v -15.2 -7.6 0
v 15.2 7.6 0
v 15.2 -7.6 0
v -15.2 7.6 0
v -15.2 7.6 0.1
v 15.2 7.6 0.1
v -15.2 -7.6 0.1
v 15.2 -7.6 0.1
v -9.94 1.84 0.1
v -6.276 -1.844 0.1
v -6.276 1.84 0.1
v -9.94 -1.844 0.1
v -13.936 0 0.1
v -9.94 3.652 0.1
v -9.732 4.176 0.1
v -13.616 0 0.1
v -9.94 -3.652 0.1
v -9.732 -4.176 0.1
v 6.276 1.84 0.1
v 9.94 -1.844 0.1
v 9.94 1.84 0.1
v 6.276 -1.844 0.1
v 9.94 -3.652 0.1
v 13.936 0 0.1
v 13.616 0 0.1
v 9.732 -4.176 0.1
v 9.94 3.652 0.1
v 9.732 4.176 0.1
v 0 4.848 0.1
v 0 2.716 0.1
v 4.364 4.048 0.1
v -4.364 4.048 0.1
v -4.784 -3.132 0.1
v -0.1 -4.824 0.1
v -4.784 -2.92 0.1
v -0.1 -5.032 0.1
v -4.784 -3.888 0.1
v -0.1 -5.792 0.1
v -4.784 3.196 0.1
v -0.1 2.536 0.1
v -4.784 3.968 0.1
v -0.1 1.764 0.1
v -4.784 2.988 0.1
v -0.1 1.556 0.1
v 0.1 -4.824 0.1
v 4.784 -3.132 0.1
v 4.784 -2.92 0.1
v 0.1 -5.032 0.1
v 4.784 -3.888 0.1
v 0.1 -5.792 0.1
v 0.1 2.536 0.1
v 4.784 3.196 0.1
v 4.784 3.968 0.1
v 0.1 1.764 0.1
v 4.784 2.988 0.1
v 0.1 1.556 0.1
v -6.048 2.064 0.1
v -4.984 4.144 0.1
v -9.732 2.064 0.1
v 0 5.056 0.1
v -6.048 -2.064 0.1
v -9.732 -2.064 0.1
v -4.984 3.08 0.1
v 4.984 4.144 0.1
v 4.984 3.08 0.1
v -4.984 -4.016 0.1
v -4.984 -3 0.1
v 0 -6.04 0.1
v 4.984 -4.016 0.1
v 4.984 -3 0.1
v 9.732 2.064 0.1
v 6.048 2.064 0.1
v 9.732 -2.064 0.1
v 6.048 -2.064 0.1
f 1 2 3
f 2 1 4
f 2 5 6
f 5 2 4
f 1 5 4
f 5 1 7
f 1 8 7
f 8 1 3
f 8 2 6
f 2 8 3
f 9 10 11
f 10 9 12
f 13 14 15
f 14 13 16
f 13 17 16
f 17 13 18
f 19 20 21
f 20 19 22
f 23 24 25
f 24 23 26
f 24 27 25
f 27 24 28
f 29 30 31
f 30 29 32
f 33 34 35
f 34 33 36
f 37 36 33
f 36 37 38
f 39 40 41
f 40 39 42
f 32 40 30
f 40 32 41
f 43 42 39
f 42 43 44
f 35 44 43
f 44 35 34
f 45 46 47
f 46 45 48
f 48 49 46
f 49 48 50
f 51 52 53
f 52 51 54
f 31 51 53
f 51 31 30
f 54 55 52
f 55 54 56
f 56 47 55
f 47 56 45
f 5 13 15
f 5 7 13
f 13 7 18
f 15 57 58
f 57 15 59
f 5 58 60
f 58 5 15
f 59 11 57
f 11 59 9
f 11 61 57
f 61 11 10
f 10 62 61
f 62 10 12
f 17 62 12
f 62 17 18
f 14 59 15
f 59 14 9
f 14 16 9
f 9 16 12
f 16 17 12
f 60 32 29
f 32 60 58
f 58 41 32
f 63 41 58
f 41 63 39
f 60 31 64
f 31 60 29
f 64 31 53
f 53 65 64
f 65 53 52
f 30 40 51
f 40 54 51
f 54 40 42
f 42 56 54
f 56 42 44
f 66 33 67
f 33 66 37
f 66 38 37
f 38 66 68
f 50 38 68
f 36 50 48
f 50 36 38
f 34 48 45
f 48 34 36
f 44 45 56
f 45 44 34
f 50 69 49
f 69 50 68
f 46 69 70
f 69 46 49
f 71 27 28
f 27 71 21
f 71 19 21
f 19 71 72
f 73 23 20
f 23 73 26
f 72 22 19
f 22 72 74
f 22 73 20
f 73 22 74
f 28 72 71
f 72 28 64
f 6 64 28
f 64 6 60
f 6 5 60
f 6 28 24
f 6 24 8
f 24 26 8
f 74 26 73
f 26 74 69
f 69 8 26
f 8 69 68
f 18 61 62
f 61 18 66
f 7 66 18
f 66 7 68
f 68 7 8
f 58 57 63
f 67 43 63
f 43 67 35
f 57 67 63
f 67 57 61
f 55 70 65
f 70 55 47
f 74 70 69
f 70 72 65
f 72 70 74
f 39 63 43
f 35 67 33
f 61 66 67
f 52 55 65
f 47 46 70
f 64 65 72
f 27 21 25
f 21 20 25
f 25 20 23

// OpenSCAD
// file: ../p/box5-12.scad
use <../lib.scad>
function ldraw_lib__box5_12() = [
// 0 Box with 5 Faces without Any Edges
// 0 Name: box5-12.dat
// 0 Author: Chris Dee [cwdee]
// 0 !LDRAW_ORG Primitive UPDATE 2009-02
// 0 !LICENSE Licensed under CC BY 2.0 and CC BY 4.0 : see CAreadme.txt
// 
// 0 BFC CERTIFY CCW
  [0,"BFC","CERTIFY"],
  [0,"BFC","CCW"],
// 
// 0 !HISTORY 2009-09-03 [PTadmin] Official Update 2009-02
// 
// 
// 4 16 1 1 1 1 1 -1 -1 1 -1 -1 1 1
  [4,16,1,1,1,1,1,-1,-1,1,-1,-1,1,1],
// 4 16 -1 0 1 1 0 1 1 1 1 -1 1 1
  [4,16,-1,0,1,1,0,1,1,1,1,-1,1,1],
// 4 16 -1 0 -1 -1 0 1 -1 1 1 -1 1 -1
  [4,16,-1,0,-1,-1,0,1,-1,1,1,-1,1,-1],
// 4 16 1 0 -1 -1 0 -1 -1 1 -1 1 1 -1
  [4,16,1,0,-1,-1,0,-1,-1,1,-1,1,1,-1],
// 4 16 1 0 1 1 0 -1 1 1 -1 1 1 1
  [4,16,1,0,1,1,0,-1,1,1,-1,1,1,1],
// 0
];
makepoly(ldraw_lib__box5_12(), line=0.2);
// main file
use <../lib.scad>
use <../p/box5-12.scad>
function ldraw_lib__190145a() = [
// 0 Sticker  1.9 x  3.8 with Yellow Box and Arrows
// 0 Name: 190145a.dat
// 0 Author: Rafael Skibicki [Rola]
// 0 !LDRAW_ORG Part UPDATE 2012-03
// 0 !LICENSE Licensed under CC BY 2.0 and CC BY 4.0 : see CAreadme.txt
// 
// 0 BFC CERTIFY CCW
  [0,"BFC","CERTIFY"],
  [0,"BFC","CCW"],
// 
// 0 !KEYWORDS Cargo, container, Crane, set 6361, town, Trains
// 
// 0 !HISTORY 2012-08-01 [MagFors] BFC'd, removed t-junctions
// 0 !HISTORY 2012-11-22 [MMR1988] removed '0' at file end.
// 0 !HISTORY 2012-12-28 [PTadmin] Official Update 2012-03
// 
// 
// 1 16 0 -0.25 0 38 0 0 0 0.25 0 0 0 19 box5-12.dat
  [1,16,0,-0.25,0,38,0,0,0,0.25,0,0,0,19, ldraw_lib__box5_12()],
// 4 14 -15.69 -0.25 -4.61 -15.69 -0.25 4.6 -24.85 -0.25 4.6 -24.85 -0.25 -4.61
  [4,14,-15.69,-0.25,-4.61,-15.69,-0.25,4.6,-24.85,-0.25,4.6,-24.85,-0.25,-4.61],
// 4 0 -34.04 -0.25 0 -24.85 -0.25 9.13 -24.33 -0.25 10.44 -34.84 -0.25 0
  [4,0,-34.04,-0.25,0,-24.85,-0.25,9.13,-24.33,-0.25,10.44,-34.84,-0.25,0],
// 4 0 -24.33 -0.25 -10.44 -24.85 -0.25 -9.13 -34.04 -0.25 0 -34.84 -0.25 0
  [4,0,-24.33,-0.25,-10.44,-24.85,-0.25,-9.13,-34.04,-0.25,0,-34.84,-0.25,0],
// 4 14 15.69 -0.25 4.6 15.69 -0.25 -4.61 24.85 -0.25 -4.61 24.85 -0.25 4.6
  [4,14,15.69,-0.25,4.6,15.69,-0.25,-4.61,24.85,-0.25,-4.61,24.85,-0.25,4.6],
// 4 0 34.04 -0.25 0 24.85 -0.25 -9.13 24.33 -0.25 -10.44 34.84 -0.25 0
  [4,0,34.04,-0.25,0,24.85,-0.25,-9.13,24.33,-0.25,-10.44,34.84,-0.25,0],
// 4 0 24.33 -0.25 10.44 24.85 -0.25 9.13 34.04 -0.25 0 34.84 -0.25 0
  [4,0,24.33,-0.25,10.44,24.85,-0.25,9.13,34.04,-0.25,0,34.84,-0.25,0],
// 4 14 0 -0.25 6.79 10.91 -0.25 10.12 0 -0.25 12.12 -10.91 -0.25 10.12
  [4,14,0,-0.25,6.79,10.91,-0.25,10.12,0,-0.25,12.12,-10.91,-0.25,10.12],
// 4 0 -11.96 -0.25 -7.83 -0.25 -0.25 -12.58 -0.25 -0.25 -12.06 -11.96 -0.25 -7.3
  [4,0,-11.96,-0.25,-7.83,-0.25,-0.25,-12.58,-0.25,-0.25,-12.06,-11.96,-0.25,-7.3],
// 4 14 -11.96 -0.25 -7.83 -11.96 -0.25 -9.72 -0.25 -0.25 -14.48 -0.25 -0.25 -12.58
  [4,14,-11.96,-0.25,-7.83,-11.96,-0.25,-9.72,-0.25,-0.25,-14.48,-0.25,-0.25,-12.58],
// 4 14 -0.25 -0.25 6.34 -11.96 -0.25 9.92 -11.96 -0.25 7.99 -0.25 -0.25 4.41
  [4,14,-0.25,-0.25,6.34,-11.96,-0.25,9.92,-11.96,-0.25,7.99,-0.25,-0.25,4.41],
// 4 0 -10.91 -0.25 10.12 -11.96 -0.25 9.92 -0.25 -0.25 6.34 0 -0.25 6.79
  [4,0,-10.91,-0.25,10.12,-11.96,-0.25,9.92,-0.25,-0.25,6.34,0,-0.25,6.79],
// 4 0 -0.25 -0.25 4.41 -11.96 -0.25 7.99 -11.96 -0.25 7.47 -0.25 -0.25 3.89
  [4,0,-0.25,-0.25,4.41,-11.96,-0.25,7.99,-11.96,-0.25,7.47,-0.25,-0.25,3.89],
// 4 14 -0.25 -0.25 3.89 -11.96 -0.25 7.47 -11.96 -0.25 -7.3 -0.25 -0.25 -12.06
  [4,14,-0.25,-0.25,3.89,-11.96,-0.25,7.47,-11.96,-0.25,-7.3,-0.25,-0.25,-12.06],
// 4 0 0.25 -0.25 -12.06 0.25 -0.25 -12.58 11.96 -0.25 -7.83 11.96 -0.25 -7.3
  [4,0,0.25,-0.25,-12.06,0.25,-0.25,-12.58,11.96,-0.25,-7.83,11.96,-0.25,-7.3],
// 4 14 0.25 -0.25 -14.48 11.96 -0.25 -9.72 11.96 -0.25 -7.83 0.25 -0.25 -12.58
  [4,14,0.25,-0.25,-14.48,11.96,-0.25,-9.72,11.96,-0.25,-7.83,0.25,-0.25,-12.58],
// 4 14 11.96 -0.25 7.99 11.96 -0.25 9.92 0.25 -0.25 6.34 0.25 -0.25 4.41
  [4,14,11.96,-0.25,7.99,11.96,-0.25,9.92,0.25,-0.25,6.34,0.25,-0.25,4.41],
// 4 0 0.25 -0.25 6.34 11.96 -0.25 9.92 10.91 -0.25 10.12 0 -0.25 6.79
  [4,0,0.25,-0.25,6.34,11.96,-0.25,9.92,10.91,-0.25,10.12,0,-0.25,6.79],
// 4 0 11.96 -0.25 7.47 11.96 -0.25 7.99 0.25 -0.25 4.41 0.25 -0.25 3.89
  [4,0,11.96,-0.25,7.47,11.96,-0.25,7.99,0.25,-0.25,4.41,0.25,-0.25,3.89],
// 4 14 11.96 -0.25 -7.3 11.96 -0.25 7.47 0.25 -0.25 3.89 0.25 -0.25 -12.06
  [4,14,11.96,-0.25,-7.3,11.96,-0.25,7.47,0.25,-0.25,3.89,0.25,-0.25,-12.06],
// 3 16 -38 -0.25 19 -34.84 -0.25 0 -24.33 -0.25 10.44
  [3,16,-38,-0.25,19,-34.84,-0.25,0,-24.33,-0.25,10.44],
// 3 16 -38 -0.25 19 -38 -0.25 -19 -34.84 -0.25 0
  [3,16,-38,-0.25,19,-38,-0.25,-19,-34.84,-0.25,0],
// 3 16 -34.84 -0.25 0 -38 -0.25 -19 -24.33 -0.25 -10.44
  [3,16,-34.84,-0.25,0,-38,-0.25,-19,-24.33,-0.25,-10.44],
// 4 16 -24.33 -0.25 10.44 -24.33 -0.25 5.16 -15.12 -0.25 5.16 -12.46 -0.25 10.36
  [4,16,-24.33,-0.25,10.44,-24.33,-0.25,5.16,-15.12,-0.25,5.16,-12.46,-0.25,10.36],
// 4 16 -24.33 -0.25 10.44 -12.46 -0.25 10.36 0 -0.25 12.64 -38 -0.25 19
  [4,16,-24.33,-0.25,10.44,-12.46,-0.25,10.36,0,-0.25,12.64,-38,-0.25,19],
// 4 0 -24.33 -0.25 5.16 -24.85 -0.25 4.6 -15.69 -0.25 4.6 -15.12 -0.25 5.16
  [4,0,-24.33,-0.25,5.16,-24.85,-0.25,4.6,-15.69,-0.25,4.6,-15.12,-0.25,5.16],
// 4 0 -15.12 -0.25 5.16 -15.69 -0.25 4.6 -15.69 -0.25 -4.61 -15.12 -0.25 -5.16
  [4,0,-15.12,-0.25,5.16,-15.69,-0.25,4.6,-15.69,-0.25,-4.61,-15.12,-0.25,-5.16],
// 4 0 -15.69 -0.25 -4.61 -24.85 -0.25 -4.61 -24.33 -0.25 -5.16 -15.12 -0.25 -5.16
  [4,0,-15.69,-0.25,-4.61,-24.85,-0.25,-4.61,-24.33,-0.25,-5.16,-15.12,-0.25,-5.16],
// 4 0 -24.33 -0.25 -5.16 -24.85 -0.25 -4.61 -24.85 -0.25 -9.13 -24.33 -0.25 -10.44
  [4,0,-24.33,-0.25,-5.16,-24.85,-0.25,-4.61,-24.85,-0.25,-9.13,-24.33,-0.25,-10.44],
// 4 0 -24.85 -0.25 9.13 -24.85 -0.25 4.6 -24.33 -0.25 5.16 -24.33 -0.25 10.44
  [4,0,-24.85,-0.25,9.13,-24.85,-0.25,4.6,-24.33,-0.25,5.16,-24.33,-0.25,10.44],
// 3 14 -24.85 -0.25 9.13 -34.04 -0.25 0 -24.85 -0.25 4.6
  [3,14,-24.85,-0.25,9.13,-34.04,-0.25,0,-24.85,-0.25,4.6],
// 3 14 -24.85 -0.25 4.6 -34.04 -0.25 0 -24.85 -0.25 -4.61
  [3,14,-24.85,-0.25,4.6,-34.04,-0.25,0,-24.85,-0.25,-4.61],
// 3 14 -34.04 -0.25 0 -24.85 -0.25 -9.13 -24.85 -0.25 -4.61
  [3,14,-34.04,-0.25,0,-24.85,-0.25,-9.13,-24.85,-0.25,-4.61],
// 4 0 -12.46 -0.25 10.36 -10.91 -0.25 10.12 0 -0.25 12.12 0 -0.25 12.64
  [4,0,-12.46,-0.25,10.36,-10.91,-0.25,10.12,0,-0.25,12.12,0,-0.25,12.64],
// 3 0 -12.46 -0.25 10.36 -11.96 -0.25 9.92 -10.91 -0.25 10.12
  [3,0,-12.46,-0.25,10.36,-11.96,-0.25,9.92,-10.91,-0.25,10.12],
// 4 0 -11.96 -0.25 7.99 -11.96 -0.25 9.92 -12.46 -0.25 10.36 -12.46 -0.25 7.7
  [4,0,-11.96,-0.25,7.99,-11.96,-0.25,9.92,-12.46,-0.25,10.36,-12.46,-0.25,7.7],
// 4 0 0 -0.25 12.12 10.91 -0.25 10.12 12.46 -0.25 10.36 0 -0.25 12.64
  [4,0,0,-0.25,12.12,10.91,-0.25,10.12,12.46,-0.25,10.36,0,-0.25,12.64],
// 3 0 12.46 -0.25 10.36 10.91 -0.25 10.12 11.96 -0.25 9.92
  [3,0,12.46,-0.25,10.36,10.91,-0.25,10.12,11.96,-0.25,9.92],
// 4 0 12.46 -0.25 10.36 11.96 -0.25 9.92 11.96 -0.25 7.99 12.46 -0.25 7.7
  [4,0,12.46,-0.25,10.36,11.96,-0.25,9.92,11.96,-0.25,7.99,12.46,-0.25,7.7],
// 3 0 0 -0.25 6.79 -0.25 -0.25 6.34 0.25 -0.25 6.34
  [3,0,0,-0.25,6.79,-0.25,-0.25,6.34,0.25,-0.25,6.34],
// 4 0 0.25 -0.25 6.34 -0.25 -0.25 6.34 -0.25 -0.25 4.41 0.25 -0.25 4.41
  [4,0,0.25,-0.25,6.34,-0.25,-0.25,6.34,-0.25,-0.25,4.41,0.25,-0.25,4.41],
// 4 0 0.25 -0.25 4.41 -0.25 -0.25 4.41 -0.25 -0.25 3.89 0.25 -0.25 3.89
  [4,0,0.25,-0.25,4.41,-0.25,-0.25,4.41,-0.25,-0.25,3.89,0.25,-0.25,3.89],
// 4 0 -12.46 -0.25 -10.04 -11.96 -0.25 -9.72 -11.96 -0.25 -7.83 -12.46 -0.25 -7.5
  [4,0,-12.46,-0.25,-10.04,-11.96,-0.25,-9.72,-11.96,-0.25,-7.83,-12.46,-0.25,-7.5],
// 4 0 -0.25 -0.25 -14.48 -11.96 -0.25 -9.72 -12.46 -0.25 -10.04 0 -0.25 -15.1
  [4,0,-0.25,-0.25,-14.48,-11.96,-0.25,-9.72,-12.46,-0.25,-10.04,0,-0.25,-15.1],
// 3 0 0.25 -0.25 -14.48 -0.25 -0.25 -14.48 0 -0.25 -15.1
  [3,0,0.25,-0.25,-14.48,-0.25,-0.25,-14.48,0,-0.25,-15.1],
// 4 0 0.25 -0.25 -12.58 -0.25 -0.25 -12.58 -0.25 -0.25 -14.48 0.25 -0.25 -14.48
  [4,0,0.25,-0.25,-12.58,-0.25,-0.25,-12.58,-0.25,-0.25,-14.48,0.25,-0.25,-14.48],
// 4 0 0.25 -0.25 -12.06 -0.25 -0.25 -12.06 -0.25 -0.25 -12.58 0.25 -0.25 -12.58
  [4,0,0.25,-0.25,-12.06,-0.25,-0.25,-12.06,-0.25,-0.25,-12.58,0.25,-0.25,-12.58],
// 4 0 0.25 -0.25 3.89 -0.25 -0.25 3.89 -0.25 -0.25 -12.06 0.25 -0.25 -12.06
  [4,0,0.25,-0.25,3.89,-0.25,-0.25,3.89,-0.25,-0.25,-12.06,0.25,-0.25,-12.06],
// 4 0 12.46 -0.25 -10.04 11.96 -0.25 -9.72 0.25 -0.25 -14.48 0 -0.25 -15.1
  [4,0,12.46,-0.25,-10.04,11.96,-0.25,-9.72,0.25,-0.25,-14.48,0,-0.25,-15.1],
// 4 0 11.96 -0.25 -7.83 11.96 -0.25 -9.72 12.46 -0.25 -10.04 12.46 -0.25 -7.5
  [4,0,11.96,-0.25,-7.83,11.96,-0.25,-9.72,12.46,-0.25,-10.04,12.46,-0.25,-7.5],
// 4 0 24.33 -0.25 5.16 24.85 -0.25 4.6 24.85 -0.25 9.13 24.33 -0.25 10.44
  [4,0,24.33,-0.25,5.16,24.85,-0.25,4.6,24.85,-0.25,9.13,24.33,-0.25,10.44],
// 4 0 15.69 -0.25 4.6 24.85 -0.25 4.6 24.33 -0.25 5.16 15.12 -0.25 5.16
  [4,0,15.69,-0.25,4.6,24.85,-0.25,4.6,24.33,-0.25,5.16,15.12,-0.25,5.16],
// 4 0 24.85 -0.25 -9.13 24.85 -0.25 -4.61 24.33 -0.25 -5.16 24.33 -0.25 -10.44
  [4,0,24.85,-0.25,-9.13,24.85,-0.25,-4.61,24.33,-0.25,-5.16,24.33,-0.25,-10.44],
// 4 0 15.12 -0.25 5.16 15.12 -0.25 -5.16 15.69 -0.25 -4.61 15.69 -0.25 4.6
  [4,0,15.12,-0.25,5.16,15.12,-0.25,-5.16,15.69,-0.25,-4.61,15.69,-0.25,4.6],
// 4 0 15.69 -0.25 -4.61 15.12 -0.25 -5.16 24.33 -0.25 -5.16 24.85 -0.25 -4.61
  [4,0,15.69,-0.25,-4.61,15.12,-0.25,-5.16,24.33,-0.25,-5.16,24.85,-0.25,-4.61],
// 4 16 24.33 -0.25 10.44 12.46 -0.25 10.36 15.12 -0.25 5.16 24.33 -0.25 5.16
  [4,16,24.33,-0.25,10.44,12.46,-0.25,10.36,15.12,-0.25,5.16,24.33,-0.25,5.16],
// 4 16 0 -0.25 12.64 12.46 -0.25 10.36 24.33 -0.25 10.44 38 -0.25 19
  [4,16,0,-0.25,12.64,12.46,-0.25,10.36,24.33,-0.25,10.44,38,-0.25,19],
// 3 16 38 -0.25 19 -38 -0.25 19 0 -0.25 12.64
  [3,16,38,-0.25,19,-38,-0.25,19,0,-0.25,12.64],
// 3 16 38 -0.25 19 24.33 -0.25 10.44 34.84 -0.25 0
  [3,16,38,-0.25,19,24.33,-0.25,10.44,34.84,-0.25,0],
// 3 16 38 -0.25 19 34.84 -0.25 0 38 -0.25 -19
  [3,16,38,-0.25,19,34.84,-0.25,0,38,-0.25,-19],
// 3 16 34.84 -0.25 0 24.33 -0.25 -10.44 38 -0.25 -19
  [3,16,34.84,-0.25,0,24.33,-0.25,-10.44,38,-0.25,-19],
// 4 16 24.33 -0.25 -10.44 24.33 -0.25 -5.16 15.12 -0.25 -5.16 12.46 -0.25 -10.04
  [4,16,24.33,-0.25,-10.44,24.33,-0.25,-5.16,15.12,-0.25,-5.16,12.46,-0.25,-10.04],
// 4 16 24.33 -0.25 -10.44 12.46 -0.25 -10.04 0 -0.25 -15.1 38 -0.25 -19
  [4,16,24.33,-0.25,-10.44,12.46,-0.25,-10.04,0,-0.25,-15.1,38,-0.25,-19],
// 4 16 -15.12 -0.25 -5.16 -24.33 -0.25 -5.16 -24.33 -0.25 -10.44 -12.46 -0.25 -10.04
  [4,16,-15.12,-0.25,-5.16,-24.33,-0.25,-5.16,-24.33,-0.25,-10.44,-12.46,-0.25,-10.04],
// 4 16 0 -0.25 -15.1 -12.46 -0.25 -10.04 -24.33 -0.25 -10.44 -38 -0.25 -19
  [4,16,0,-0.25,-15.1,-12.46,-0.25,-10.04,-24.33,-0.25,-10.44,-38,-0.25,-19],
// 3 16 0 -0.25 -15.1 -38 -0.25 -19 38 -0.25 -19
  [3,16,0,-0.25,-15.1,-38,-0.25,-19,38,-0.25,-19],
// 3 16 -12.46 -0.25 10.36 -15.12 -0.25 5.16 -12.46 -0.25 7.7
  [3,16,-12.46,-0.25,10.36,-15.12,-0.25,5.16,-12.46,-0.25,7.7],
// 4 0 -12.46 -0.25 7.7 -12.46 -0.25 -7.5 -11.96 -0.25 -7.3 -11.96 -0.25 7.47
  [4,0,-12.46,-0.25,7.7,-12.46,-0.25,-7.5,-11.96,-0.25,-7.3,-11.96,-0.25,7.47],
// 4 16 -12.46 -0.25 -7.5 -12.46 -0.25 7.7 -15.12 -0.25 5.16 -15.12 -0.25 -5.16
  [4,16,-12.46,-0.25,-7.5,-12.46,-0.25,7.7,-15.12,-0.25,5.16,-15.12,-0.25,-5.16],
// 4 0 11.96 -0.25 -7.3 12.46 -0.25 -7.5 12.46 -0.25 7.7 11.96 -0.25 7.47
  [4,0,11.96,-0.25,-7.3,12.46,-0.25,-7.5,12.46,-0.25,7.7,11.96,-0.25,7.47],
// 3 16 15.12 -0.25 -5.16 12.46 -0.25 -7.5 12.46 -0.25 -10.04
  [3,16,15.12,-0.25,-5.16,12.46,-0.25,-7.5,12.46,-0.25,-10.04],
// 4 16 12.46 -0.25 7.7 12.46 -0.25 -7.5 15.12 -0.25 -5.16 15.12 -0.25 5.16
  [4,16,12.46,-0.25,7.7,12.46,-0.25,-7.5,15.12,-0.25,-5.16,15.12,-0.25,5.16],
// 3 0 -11.96 -0.25 7.99 -12.46 -0.25 7.7 -11.96 -0.25 7.47
  [3,0,-11.96,-0.25,7.99,-12.46,-0.25,7.7,-11.96,-0.25,7.47],
// 3 0 -11.96 -0.25 -7.3 -12.46 -0.25 -7.5 -11.96 -0.25 -7.83
  [3,0,-11.96,-0.25,-7.3,-12.46,-0.25,-7.5,-11.96,-0.25,-7.83],
// 3 16 -15.12 -0.25 -5.16 -12.46 -0.25 -10.04 -12.46 -0.25 -7.5
  [3,16,-15.12,-0.25,-5.16,-12.46,-0.25,-10.04,-12.46,-0.25,-7.5],
// 3 0 11.96 -0.25 7.99 11.96 -0.25 7.47 12.46 -0.25 7.7
  [3,0,11.96,-0.25,7.99,11.96,-0.25,7.47,12.46,-0.25,7.7],
// 3 0 11.96 -0.25 -7.3 11.96 -0.25 -7.83 12.46 -0.25 -7.5
  [3,0,11.96,-0.25,-7.3,11.96,-0.25,-7.83,12.46,-0.25,-7.5],
// 3 16 12.46 -0.25 10.36 12.46 -0.25 7.7 15.12 -0.25 5.16
  [3,16,12.46,-0.25,10.36,12.46,-0.25,7.7,15.12,-0.25,5.16],
// 3 14 24.85 -0.25 9.13 24.85 -0.25 4.6 34.04 -0.25 0
  [3,14,24.85,-0.25,9.13,24.85,-0.25,4.6,34.04,-0.25,0],
// 3 14 24.85 -0.25 4.6 24.85 -0.25 -4.61 34.04 -0.25 0
  [3,14,24.85,-0.25,4.6,24.85,-0.25,-4.61,34.04,-0.25,0],
// 3 14 34.04 -0.25 0 24.85 -0.25 -4.61 24.85 -0.25 -9.13
  [3,14,34.04,-0.25,0,24.85,-0.25,-4.61,24.85,-0.25,-9.13],
];
makepoly(ldraw_lib__190145a(), line=0.2);
